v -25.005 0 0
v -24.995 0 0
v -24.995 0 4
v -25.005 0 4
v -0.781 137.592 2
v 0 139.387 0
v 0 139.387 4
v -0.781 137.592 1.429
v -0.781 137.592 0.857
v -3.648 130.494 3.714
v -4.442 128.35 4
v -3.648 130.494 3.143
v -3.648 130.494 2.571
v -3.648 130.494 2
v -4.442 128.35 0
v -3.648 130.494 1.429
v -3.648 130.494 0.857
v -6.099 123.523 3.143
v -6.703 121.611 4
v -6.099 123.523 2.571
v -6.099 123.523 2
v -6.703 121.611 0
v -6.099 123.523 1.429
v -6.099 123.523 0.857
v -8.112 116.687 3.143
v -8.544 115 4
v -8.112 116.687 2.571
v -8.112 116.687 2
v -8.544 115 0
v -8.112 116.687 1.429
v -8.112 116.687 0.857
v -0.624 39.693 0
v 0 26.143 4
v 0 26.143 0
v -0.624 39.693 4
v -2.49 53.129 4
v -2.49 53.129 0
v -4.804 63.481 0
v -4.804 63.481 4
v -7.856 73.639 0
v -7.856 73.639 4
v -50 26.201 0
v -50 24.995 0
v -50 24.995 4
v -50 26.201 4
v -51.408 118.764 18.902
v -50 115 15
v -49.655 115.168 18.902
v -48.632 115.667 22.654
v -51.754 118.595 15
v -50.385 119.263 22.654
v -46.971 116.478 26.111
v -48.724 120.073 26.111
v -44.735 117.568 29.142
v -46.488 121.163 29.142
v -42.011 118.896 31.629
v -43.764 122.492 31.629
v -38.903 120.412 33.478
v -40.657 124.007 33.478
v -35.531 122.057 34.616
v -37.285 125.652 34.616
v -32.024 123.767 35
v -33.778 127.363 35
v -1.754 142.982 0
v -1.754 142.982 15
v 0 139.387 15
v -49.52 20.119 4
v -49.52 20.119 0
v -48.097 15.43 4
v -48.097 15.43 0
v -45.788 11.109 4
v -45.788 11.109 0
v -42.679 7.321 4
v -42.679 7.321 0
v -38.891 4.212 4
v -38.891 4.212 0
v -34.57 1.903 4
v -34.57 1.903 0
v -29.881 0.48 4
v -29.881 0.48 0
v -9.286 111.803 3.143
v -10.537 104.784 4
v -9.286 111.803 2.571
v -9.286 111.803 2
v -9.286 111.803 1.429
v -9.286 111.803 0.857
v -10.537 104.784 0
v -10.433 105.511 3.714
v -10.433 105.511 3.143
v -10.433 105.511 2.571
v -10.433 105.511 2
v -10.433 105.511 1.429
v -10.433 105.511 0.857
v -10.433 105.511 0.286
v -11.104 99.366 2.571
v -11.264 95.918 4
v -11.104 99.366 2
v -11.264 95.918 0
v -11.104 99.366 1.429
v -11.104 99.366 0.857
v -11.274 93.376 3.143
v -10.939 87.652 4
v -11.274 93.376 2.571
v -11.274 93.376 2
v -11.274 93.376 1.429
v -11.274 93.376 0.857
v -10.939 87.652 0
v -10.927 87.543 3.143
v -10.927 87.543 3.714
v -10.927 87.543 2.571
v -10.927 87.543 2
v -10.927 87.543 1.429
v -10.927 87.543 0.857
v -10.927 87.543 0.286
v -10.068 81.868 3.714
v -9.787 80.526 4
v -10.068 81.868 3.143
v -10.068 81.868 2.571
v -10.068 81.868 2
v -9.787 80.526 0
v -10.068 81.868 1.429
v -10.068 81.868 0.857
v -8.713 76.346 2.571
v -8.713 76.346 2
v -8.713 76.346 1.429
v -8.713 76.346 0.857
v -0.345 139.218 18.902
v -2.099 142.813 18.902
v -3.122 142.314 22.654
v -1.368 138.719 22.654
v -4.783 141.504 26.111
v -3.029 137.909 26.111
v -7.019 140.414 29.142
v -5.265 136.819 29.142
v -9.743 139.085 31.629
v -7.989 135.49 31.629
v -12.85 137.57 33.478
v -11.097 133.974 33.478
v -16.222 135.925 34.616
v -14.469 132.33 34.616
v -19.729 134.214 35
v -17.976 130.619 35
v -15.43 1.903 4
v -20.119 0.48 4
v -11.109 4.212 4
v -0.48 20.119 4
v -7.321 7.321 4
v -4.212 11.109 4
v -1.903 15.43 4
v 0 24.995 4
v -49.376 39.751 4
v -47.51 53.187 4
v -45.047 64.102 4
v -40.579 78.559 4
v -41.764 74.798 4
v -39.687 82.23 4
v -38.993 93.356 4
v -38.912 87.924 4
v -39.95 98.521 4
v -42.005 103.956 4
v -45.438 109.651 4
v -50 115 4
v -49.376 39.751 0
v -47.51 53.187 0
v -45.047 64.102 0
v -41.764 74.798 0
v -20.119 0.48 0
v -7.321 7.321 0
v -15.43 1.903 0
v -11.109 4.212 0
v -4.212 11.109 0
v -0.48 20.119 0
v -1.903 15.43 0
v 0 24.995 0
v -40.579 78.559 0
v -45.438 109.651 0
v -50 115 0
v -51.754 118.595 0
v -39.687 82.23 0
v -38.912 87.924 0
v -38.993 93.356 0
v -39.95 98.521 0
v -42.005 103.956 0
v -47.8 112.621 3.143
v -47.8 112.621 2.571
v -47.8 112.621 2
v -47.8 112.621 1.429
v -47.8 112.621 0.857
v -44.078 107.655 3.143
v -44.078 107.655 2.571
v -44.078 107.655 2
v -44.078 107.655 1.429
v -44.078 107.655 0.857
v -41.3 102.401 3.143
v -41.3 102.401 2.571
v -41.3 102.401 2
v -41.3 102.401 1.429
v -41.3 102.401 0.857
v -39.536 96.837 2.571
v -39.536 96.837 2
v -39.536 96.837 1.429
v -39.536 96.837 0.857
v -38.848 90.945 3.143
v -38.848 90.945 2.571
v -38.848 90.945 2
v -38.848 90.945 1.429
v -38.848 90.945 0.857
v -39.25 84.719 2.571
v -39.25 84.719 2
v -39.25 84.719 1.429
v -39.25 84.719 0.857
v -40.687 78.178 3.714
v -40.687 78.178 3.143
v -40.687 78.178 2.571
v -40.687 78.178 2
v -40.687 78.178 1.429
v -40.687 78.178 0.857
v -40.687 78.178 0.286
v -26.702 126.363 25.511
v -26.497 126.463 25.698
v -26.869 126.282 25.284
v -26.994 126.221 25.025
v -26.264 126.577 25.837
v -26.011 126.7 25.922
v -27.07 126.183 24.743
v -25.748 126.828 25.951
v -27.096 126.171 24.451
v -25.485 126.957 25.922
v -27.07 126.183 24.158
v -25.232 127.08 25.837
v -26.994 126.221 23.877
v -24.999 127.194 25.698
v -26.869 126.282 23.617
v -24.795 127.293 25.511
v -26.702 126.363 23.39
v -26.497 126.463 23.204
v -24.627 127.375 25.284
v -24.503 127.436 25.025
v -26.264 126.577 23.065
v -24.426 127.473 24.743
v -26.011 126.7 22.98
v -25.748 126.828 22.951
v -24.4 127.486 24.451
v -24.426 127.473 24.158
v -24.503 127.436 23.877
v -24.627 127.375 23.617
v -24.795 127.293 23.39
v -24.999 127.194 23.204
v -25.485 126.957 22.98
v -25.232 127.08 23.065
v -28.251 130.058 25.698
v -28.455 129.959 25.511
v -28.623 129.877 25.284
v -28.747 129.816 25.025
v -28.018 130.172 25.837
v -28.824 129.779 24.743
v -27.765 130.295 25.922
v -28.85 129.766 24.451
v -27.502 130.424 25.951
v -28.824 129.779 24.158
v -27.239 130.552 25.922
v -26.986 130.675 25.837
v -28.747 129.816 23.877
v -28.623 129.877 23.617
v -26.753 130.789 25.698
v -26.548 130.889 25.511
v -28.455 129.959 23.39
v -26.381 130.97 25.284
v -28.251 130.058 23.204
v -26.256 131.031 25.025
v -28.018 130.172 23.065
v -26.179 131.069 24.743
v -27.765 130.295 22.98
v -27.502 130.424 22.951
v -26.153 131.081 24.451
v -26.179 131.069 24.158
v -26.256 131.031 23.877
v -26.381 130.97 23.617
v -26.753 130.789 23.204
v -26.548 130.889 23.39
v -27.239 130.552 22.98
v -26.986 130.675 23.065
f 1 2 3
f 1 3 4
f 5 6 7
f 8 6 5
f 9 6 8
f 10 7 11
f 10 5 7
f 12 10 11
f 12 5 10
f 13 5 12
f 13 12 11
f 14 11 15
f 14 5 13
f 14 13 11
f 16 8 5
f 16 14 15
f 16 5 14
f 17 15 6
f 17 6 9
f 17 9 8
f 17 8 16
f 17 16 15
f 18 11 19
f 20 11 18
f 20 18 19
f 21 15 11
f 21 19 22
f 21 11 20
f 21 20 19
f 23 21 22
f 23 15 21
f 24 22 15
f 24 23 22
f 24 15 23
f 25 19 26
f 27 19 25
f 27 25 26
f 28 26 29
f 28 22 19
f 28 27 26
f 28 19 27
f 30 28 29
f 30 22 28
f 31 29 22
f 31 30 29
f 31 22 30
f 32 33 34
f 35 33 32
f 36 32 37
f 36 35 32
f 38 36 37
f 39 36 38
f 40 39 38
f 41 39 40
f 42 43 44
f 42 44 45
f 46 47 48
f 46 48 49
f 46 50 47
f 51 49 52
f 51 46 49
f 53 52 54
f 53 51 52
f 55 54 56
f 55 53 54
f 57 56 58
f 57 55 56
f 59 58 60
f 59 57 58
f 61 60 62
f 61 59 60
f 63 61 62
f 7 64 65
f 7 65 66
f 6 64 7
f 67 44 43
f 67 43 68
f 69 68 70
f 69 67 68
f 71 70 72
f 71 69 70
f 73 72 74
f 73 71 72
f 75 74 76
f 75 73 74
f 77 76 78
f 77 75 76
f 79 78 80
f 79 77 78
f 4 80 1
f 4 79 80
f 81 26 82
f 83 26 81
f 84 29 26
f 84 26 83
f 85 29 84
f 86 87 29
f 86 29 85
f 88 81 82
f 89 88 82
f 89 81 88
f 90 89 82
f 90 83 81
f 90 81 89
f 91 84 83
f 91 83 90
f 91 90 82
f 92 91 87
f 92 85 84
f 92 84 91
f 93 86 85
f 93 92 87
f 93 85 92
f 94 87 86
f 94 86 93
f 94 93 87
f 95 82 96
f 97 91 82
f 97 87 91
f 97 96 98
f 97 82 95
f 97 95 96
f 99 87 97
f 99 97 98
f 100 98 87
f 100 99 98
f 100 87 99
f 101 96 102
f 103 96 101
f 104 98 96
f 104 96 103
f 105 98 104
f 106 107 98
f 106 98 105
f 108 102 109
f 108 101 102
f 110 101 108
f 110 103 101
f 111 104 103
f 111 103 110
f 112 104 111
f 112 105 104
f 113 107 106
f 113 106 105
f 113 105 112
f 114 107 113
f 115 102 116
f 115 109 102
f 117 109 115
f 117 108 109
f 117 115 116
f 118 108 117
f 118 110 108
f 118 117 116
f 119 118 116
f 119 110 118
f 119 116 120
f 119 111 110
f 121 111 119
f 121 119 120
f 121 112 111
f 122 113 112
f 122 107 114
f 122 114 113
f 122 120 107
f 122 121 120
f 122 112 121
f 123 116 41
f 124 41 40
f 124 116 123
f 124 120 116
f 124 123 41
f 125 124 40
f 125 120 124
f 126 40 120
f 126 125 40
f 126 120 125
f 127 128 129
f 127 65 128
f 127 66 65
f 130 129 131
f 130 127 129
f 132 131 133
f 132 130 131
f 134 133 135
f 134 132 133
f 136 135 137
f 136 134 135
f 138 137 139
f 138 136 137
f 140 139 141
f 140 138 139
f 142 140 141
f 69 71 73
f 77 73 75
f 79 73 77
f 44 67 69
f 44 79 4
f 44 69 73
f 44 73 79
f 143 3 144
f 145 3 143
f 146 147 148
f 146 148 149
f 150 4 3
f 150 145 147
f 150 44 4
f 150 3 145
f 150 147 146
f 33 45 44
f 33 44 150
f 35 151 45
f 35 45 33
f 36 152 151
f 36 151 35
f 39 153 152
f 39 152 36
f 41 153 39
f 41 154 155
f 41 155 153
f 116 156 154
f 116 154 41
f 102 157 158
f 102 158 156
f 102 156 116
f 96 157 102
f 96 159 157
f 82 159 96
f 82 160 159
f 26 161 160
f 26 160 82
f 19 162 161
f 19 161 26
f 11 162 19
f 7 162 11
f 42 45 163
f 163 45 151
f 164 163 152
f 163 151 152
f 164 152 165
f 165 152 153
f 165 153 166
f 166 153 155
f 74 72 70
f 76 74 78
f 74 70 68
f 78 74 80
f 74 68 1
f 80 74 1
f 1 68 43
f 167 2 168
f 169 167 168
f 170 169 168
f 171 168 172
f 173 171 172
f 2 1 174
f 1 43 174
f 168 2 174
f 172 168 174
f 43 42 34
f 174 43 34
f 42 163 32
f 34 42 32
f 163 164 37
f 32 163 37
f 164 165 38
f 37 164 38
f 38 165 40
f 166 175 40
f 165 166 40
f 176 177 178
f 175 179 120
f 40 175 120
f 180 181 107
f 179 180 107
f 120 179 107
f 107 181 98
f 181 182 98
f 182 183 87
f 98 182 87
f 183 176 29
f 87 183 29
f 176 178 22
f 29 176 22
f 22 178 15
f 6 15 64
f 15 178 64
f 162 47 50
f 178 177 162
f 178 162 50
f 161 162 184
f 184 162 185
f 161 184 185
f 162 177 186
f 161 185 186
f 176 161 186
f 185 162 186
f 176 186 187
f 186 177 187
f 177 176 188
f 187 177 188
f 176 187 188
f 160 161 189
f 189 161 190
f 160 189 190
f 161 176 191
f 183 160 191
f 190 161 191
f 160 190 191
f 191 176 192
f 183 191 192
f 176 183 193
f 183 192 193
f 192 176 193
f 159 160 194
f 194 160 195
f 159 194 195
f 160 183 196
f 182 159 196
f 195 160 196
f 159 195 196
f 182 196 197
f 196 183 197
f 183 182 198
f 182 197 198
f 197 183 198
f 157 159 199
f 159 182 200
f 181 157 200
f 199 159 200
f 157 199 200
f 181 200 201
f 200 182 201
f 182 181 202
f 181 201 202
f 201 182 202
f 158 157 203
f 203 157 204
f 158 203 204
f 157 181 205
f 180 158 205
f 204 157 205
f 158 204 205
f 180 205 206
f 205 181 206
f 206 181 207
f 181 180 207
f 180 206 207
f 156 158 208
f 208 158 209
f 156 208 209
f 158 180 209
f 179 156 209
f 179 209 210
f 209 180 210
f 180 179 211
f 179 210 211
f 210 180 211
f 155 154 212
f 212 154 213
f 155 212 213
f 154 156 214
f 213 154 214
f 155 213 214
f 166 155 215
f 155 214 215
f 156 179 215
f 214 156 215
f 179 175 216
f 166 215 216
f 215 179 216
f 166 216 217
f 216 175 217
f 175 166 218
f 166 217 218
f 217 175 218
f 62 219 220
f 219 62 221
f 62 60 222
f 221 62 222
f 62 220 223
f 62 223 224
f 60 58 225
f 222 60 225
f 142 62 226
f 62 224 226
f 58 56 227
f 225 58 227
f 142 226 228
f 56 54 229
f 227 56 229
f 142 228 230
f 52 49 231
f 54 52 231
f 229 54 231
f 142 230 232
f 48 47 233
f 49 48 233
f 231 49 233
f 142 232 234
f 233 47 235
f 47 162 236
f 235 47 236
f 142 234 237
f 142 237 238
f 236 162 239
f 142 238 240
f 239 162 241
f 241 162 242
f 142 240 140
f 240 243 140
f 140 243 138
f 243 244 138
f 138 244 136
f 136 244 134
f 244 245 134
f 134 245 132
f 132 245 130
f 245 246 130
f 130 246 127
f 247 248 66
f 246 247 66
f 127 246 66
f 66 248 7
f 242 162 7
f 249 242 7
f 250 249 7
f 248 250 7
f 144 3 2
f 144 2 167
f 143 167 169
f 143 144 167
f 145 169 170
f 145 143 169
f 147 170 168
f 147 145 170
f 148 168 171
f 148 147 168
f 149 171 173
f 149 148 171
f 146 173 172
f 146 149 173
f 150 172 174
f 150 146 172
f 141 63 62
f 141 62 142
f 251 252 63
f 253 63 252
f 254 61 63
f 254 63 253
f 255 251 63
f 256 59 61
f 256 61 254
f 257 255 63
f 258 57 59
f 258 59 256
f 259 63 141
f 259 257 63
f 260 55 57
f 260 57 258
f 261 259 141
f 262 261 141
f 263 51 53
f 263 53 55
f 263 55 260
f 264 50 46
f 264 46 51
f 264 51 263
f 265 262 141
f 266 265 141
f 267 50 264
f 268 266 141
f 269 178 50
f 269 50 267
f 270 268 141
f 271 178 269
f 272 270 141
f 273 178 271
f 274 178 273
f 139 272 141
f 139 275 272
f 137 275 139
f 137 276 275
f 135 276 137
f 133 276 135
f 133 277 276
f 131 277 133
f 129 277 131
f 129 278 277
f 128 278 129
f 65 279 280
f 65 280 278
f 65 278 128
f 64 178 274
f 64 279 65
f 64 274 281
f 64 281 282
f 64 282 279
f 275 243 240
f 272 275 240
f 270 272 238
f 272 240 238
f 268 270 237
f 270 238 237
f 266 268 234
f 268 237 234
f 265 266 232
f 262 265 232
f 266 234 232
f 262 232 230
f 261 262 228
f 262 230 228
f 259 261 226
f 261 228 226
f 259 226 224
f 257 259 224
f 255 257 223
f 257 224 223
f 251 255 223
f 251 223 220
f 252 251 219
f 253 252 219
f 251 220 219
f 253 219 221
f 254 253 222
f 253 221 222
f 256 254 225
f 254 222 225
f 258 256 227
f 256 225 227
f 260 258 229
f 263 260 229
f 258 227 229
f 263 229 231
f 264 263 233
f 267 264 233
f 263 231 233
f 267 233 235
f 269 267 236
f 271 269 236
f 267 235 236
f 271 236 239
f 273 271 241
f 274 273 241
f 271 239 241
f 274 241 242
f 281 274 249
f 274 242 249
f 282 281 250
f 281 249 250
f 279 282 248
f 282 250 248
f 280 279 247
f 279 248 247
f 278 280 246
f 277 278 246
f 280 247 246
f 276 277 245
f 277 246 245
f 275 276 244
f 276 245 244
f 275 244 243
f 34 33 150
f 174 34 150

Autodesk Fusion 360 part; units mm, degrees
sketch "Sketch1" plane through (0, 0, 0) normal (0, 0, 1) x (1, 0, 0)
  line L0 (0, 0) -> (-50, 0)
  line L1 (-50, 0) -> (-50, 115)
  line L2 (-50, 115) -> (0, 115)
  line L3 (0, 115) -> (0, 0)
  line L4 (-50, 115) -> (0, 139.3866)
  line L5 (0, 139.3866) -> (0, 115)
  line L6 (-50, 115) -> (-51.7535, 118.5952)
  line L7 (-51.7535, 118.5952) -> (-1.7535, 142.9818)
  line L8 (-1.7535, 142.9818) -> (0, 139.3866)
  spline S0 degree 5 poles (-50, 115) (-49.1286, 114.1162) (-47.4651, 112.3243) (-45.2074, 109.5639) (-42.6804, 105.7358) (-40.3787, 100.6888) (-38.9992, 95.3602) (-38.5993, 89.7323) (-39.1781, 83.8055) (-40.6677, 77.6006) (-42.9855, 71.1426) (-45.4417, 65.7923) (-47.6, 61.6831) (-49.177, 58.9014) (-50, 57.5) knots 0 0 0 0 0 0 0.1 0.2 0.3 0.4 0.5 0.6 0.7 0.8 0.9 1 1 1 1 1 1
  spline S1 degree 5 poles (0, 139.3866) (-0.8361, 137.4921) (-2.4376, 133.7247) (-4.6279, 128.1387) (-7.1171, 120.8232) (-9.4593, 111.9151) (-10.9559, 103.2668) (-11.5257, 94.9031) (-11.1043, 86.8438) (-9.6988, 79.0869) (-7.3699, 71.6136) (-4.822, 65.8453) (-2.5494, 61.6301) (-0.8762, 58.8686) (0, 57.5) knots 0 0 0 0 0 0 0.1 0.2 0.3 0.4 0.5 0.6 0.7 0.8 0.9 1 1 1 1 1 1
  point P0 (-38.8957, 92.1099)
  point P1 (-11.243, 92.1099)
  dimension "d1" = 50
  dimension "d2" = 115
  dimension "d3" = 26
  dimension "d4" = 4
extrude "Extrude1" add sketch "Sketch1" along normal blind 4 contours L0 L1 L2 L3 S0 S1 | L2 L4 S1 | L4 L6 L7 L8
extrude "Extrude2" add sketch "Sketch1" along normal blind 35 contours L4 L6 L7 L8
fillet "Fillet1" radius 20 2 edges at (-50.8767, 116.7976, 35) (-0.8767, 141.1842, 35)
fillet "Fillet2" radius 25 2 edges at (-50, 0, 2) (0, 0, 2)
fillet "Fillet3" radius 147.5 2 edges at (0, 57.5, 2) (-50, 57.5, 2)
sketch "Sketch2" plane through (-54.9191, 112.6008, 0) normal (0.4384, -0.8988, 0) x (0.8988, 0.4384, 0)
  arc A0 (61.1031, 15) -> (41.1031, 35) centre (41.1031, 15) ccw
  line L0 (41.1031, 35) -> (25.473, 35)
  arc A1 (25.473, 35) -> (5.473, 15) centre (25.473, 15) ccw
  line L1 (5.473, 15) -> (5.473, 4)
  line L2 (5.473, 4) -> (61.1031, 4)
  line L3 (61.1031, 4) -> (61.1031, 15)
  circle A2 centre (32.4556, 24.4508) radius 1.5
  dimension "d15" = 3
extrude "Extrude3" cut sketch "Sketch2" against normal blind 20 contours A2
